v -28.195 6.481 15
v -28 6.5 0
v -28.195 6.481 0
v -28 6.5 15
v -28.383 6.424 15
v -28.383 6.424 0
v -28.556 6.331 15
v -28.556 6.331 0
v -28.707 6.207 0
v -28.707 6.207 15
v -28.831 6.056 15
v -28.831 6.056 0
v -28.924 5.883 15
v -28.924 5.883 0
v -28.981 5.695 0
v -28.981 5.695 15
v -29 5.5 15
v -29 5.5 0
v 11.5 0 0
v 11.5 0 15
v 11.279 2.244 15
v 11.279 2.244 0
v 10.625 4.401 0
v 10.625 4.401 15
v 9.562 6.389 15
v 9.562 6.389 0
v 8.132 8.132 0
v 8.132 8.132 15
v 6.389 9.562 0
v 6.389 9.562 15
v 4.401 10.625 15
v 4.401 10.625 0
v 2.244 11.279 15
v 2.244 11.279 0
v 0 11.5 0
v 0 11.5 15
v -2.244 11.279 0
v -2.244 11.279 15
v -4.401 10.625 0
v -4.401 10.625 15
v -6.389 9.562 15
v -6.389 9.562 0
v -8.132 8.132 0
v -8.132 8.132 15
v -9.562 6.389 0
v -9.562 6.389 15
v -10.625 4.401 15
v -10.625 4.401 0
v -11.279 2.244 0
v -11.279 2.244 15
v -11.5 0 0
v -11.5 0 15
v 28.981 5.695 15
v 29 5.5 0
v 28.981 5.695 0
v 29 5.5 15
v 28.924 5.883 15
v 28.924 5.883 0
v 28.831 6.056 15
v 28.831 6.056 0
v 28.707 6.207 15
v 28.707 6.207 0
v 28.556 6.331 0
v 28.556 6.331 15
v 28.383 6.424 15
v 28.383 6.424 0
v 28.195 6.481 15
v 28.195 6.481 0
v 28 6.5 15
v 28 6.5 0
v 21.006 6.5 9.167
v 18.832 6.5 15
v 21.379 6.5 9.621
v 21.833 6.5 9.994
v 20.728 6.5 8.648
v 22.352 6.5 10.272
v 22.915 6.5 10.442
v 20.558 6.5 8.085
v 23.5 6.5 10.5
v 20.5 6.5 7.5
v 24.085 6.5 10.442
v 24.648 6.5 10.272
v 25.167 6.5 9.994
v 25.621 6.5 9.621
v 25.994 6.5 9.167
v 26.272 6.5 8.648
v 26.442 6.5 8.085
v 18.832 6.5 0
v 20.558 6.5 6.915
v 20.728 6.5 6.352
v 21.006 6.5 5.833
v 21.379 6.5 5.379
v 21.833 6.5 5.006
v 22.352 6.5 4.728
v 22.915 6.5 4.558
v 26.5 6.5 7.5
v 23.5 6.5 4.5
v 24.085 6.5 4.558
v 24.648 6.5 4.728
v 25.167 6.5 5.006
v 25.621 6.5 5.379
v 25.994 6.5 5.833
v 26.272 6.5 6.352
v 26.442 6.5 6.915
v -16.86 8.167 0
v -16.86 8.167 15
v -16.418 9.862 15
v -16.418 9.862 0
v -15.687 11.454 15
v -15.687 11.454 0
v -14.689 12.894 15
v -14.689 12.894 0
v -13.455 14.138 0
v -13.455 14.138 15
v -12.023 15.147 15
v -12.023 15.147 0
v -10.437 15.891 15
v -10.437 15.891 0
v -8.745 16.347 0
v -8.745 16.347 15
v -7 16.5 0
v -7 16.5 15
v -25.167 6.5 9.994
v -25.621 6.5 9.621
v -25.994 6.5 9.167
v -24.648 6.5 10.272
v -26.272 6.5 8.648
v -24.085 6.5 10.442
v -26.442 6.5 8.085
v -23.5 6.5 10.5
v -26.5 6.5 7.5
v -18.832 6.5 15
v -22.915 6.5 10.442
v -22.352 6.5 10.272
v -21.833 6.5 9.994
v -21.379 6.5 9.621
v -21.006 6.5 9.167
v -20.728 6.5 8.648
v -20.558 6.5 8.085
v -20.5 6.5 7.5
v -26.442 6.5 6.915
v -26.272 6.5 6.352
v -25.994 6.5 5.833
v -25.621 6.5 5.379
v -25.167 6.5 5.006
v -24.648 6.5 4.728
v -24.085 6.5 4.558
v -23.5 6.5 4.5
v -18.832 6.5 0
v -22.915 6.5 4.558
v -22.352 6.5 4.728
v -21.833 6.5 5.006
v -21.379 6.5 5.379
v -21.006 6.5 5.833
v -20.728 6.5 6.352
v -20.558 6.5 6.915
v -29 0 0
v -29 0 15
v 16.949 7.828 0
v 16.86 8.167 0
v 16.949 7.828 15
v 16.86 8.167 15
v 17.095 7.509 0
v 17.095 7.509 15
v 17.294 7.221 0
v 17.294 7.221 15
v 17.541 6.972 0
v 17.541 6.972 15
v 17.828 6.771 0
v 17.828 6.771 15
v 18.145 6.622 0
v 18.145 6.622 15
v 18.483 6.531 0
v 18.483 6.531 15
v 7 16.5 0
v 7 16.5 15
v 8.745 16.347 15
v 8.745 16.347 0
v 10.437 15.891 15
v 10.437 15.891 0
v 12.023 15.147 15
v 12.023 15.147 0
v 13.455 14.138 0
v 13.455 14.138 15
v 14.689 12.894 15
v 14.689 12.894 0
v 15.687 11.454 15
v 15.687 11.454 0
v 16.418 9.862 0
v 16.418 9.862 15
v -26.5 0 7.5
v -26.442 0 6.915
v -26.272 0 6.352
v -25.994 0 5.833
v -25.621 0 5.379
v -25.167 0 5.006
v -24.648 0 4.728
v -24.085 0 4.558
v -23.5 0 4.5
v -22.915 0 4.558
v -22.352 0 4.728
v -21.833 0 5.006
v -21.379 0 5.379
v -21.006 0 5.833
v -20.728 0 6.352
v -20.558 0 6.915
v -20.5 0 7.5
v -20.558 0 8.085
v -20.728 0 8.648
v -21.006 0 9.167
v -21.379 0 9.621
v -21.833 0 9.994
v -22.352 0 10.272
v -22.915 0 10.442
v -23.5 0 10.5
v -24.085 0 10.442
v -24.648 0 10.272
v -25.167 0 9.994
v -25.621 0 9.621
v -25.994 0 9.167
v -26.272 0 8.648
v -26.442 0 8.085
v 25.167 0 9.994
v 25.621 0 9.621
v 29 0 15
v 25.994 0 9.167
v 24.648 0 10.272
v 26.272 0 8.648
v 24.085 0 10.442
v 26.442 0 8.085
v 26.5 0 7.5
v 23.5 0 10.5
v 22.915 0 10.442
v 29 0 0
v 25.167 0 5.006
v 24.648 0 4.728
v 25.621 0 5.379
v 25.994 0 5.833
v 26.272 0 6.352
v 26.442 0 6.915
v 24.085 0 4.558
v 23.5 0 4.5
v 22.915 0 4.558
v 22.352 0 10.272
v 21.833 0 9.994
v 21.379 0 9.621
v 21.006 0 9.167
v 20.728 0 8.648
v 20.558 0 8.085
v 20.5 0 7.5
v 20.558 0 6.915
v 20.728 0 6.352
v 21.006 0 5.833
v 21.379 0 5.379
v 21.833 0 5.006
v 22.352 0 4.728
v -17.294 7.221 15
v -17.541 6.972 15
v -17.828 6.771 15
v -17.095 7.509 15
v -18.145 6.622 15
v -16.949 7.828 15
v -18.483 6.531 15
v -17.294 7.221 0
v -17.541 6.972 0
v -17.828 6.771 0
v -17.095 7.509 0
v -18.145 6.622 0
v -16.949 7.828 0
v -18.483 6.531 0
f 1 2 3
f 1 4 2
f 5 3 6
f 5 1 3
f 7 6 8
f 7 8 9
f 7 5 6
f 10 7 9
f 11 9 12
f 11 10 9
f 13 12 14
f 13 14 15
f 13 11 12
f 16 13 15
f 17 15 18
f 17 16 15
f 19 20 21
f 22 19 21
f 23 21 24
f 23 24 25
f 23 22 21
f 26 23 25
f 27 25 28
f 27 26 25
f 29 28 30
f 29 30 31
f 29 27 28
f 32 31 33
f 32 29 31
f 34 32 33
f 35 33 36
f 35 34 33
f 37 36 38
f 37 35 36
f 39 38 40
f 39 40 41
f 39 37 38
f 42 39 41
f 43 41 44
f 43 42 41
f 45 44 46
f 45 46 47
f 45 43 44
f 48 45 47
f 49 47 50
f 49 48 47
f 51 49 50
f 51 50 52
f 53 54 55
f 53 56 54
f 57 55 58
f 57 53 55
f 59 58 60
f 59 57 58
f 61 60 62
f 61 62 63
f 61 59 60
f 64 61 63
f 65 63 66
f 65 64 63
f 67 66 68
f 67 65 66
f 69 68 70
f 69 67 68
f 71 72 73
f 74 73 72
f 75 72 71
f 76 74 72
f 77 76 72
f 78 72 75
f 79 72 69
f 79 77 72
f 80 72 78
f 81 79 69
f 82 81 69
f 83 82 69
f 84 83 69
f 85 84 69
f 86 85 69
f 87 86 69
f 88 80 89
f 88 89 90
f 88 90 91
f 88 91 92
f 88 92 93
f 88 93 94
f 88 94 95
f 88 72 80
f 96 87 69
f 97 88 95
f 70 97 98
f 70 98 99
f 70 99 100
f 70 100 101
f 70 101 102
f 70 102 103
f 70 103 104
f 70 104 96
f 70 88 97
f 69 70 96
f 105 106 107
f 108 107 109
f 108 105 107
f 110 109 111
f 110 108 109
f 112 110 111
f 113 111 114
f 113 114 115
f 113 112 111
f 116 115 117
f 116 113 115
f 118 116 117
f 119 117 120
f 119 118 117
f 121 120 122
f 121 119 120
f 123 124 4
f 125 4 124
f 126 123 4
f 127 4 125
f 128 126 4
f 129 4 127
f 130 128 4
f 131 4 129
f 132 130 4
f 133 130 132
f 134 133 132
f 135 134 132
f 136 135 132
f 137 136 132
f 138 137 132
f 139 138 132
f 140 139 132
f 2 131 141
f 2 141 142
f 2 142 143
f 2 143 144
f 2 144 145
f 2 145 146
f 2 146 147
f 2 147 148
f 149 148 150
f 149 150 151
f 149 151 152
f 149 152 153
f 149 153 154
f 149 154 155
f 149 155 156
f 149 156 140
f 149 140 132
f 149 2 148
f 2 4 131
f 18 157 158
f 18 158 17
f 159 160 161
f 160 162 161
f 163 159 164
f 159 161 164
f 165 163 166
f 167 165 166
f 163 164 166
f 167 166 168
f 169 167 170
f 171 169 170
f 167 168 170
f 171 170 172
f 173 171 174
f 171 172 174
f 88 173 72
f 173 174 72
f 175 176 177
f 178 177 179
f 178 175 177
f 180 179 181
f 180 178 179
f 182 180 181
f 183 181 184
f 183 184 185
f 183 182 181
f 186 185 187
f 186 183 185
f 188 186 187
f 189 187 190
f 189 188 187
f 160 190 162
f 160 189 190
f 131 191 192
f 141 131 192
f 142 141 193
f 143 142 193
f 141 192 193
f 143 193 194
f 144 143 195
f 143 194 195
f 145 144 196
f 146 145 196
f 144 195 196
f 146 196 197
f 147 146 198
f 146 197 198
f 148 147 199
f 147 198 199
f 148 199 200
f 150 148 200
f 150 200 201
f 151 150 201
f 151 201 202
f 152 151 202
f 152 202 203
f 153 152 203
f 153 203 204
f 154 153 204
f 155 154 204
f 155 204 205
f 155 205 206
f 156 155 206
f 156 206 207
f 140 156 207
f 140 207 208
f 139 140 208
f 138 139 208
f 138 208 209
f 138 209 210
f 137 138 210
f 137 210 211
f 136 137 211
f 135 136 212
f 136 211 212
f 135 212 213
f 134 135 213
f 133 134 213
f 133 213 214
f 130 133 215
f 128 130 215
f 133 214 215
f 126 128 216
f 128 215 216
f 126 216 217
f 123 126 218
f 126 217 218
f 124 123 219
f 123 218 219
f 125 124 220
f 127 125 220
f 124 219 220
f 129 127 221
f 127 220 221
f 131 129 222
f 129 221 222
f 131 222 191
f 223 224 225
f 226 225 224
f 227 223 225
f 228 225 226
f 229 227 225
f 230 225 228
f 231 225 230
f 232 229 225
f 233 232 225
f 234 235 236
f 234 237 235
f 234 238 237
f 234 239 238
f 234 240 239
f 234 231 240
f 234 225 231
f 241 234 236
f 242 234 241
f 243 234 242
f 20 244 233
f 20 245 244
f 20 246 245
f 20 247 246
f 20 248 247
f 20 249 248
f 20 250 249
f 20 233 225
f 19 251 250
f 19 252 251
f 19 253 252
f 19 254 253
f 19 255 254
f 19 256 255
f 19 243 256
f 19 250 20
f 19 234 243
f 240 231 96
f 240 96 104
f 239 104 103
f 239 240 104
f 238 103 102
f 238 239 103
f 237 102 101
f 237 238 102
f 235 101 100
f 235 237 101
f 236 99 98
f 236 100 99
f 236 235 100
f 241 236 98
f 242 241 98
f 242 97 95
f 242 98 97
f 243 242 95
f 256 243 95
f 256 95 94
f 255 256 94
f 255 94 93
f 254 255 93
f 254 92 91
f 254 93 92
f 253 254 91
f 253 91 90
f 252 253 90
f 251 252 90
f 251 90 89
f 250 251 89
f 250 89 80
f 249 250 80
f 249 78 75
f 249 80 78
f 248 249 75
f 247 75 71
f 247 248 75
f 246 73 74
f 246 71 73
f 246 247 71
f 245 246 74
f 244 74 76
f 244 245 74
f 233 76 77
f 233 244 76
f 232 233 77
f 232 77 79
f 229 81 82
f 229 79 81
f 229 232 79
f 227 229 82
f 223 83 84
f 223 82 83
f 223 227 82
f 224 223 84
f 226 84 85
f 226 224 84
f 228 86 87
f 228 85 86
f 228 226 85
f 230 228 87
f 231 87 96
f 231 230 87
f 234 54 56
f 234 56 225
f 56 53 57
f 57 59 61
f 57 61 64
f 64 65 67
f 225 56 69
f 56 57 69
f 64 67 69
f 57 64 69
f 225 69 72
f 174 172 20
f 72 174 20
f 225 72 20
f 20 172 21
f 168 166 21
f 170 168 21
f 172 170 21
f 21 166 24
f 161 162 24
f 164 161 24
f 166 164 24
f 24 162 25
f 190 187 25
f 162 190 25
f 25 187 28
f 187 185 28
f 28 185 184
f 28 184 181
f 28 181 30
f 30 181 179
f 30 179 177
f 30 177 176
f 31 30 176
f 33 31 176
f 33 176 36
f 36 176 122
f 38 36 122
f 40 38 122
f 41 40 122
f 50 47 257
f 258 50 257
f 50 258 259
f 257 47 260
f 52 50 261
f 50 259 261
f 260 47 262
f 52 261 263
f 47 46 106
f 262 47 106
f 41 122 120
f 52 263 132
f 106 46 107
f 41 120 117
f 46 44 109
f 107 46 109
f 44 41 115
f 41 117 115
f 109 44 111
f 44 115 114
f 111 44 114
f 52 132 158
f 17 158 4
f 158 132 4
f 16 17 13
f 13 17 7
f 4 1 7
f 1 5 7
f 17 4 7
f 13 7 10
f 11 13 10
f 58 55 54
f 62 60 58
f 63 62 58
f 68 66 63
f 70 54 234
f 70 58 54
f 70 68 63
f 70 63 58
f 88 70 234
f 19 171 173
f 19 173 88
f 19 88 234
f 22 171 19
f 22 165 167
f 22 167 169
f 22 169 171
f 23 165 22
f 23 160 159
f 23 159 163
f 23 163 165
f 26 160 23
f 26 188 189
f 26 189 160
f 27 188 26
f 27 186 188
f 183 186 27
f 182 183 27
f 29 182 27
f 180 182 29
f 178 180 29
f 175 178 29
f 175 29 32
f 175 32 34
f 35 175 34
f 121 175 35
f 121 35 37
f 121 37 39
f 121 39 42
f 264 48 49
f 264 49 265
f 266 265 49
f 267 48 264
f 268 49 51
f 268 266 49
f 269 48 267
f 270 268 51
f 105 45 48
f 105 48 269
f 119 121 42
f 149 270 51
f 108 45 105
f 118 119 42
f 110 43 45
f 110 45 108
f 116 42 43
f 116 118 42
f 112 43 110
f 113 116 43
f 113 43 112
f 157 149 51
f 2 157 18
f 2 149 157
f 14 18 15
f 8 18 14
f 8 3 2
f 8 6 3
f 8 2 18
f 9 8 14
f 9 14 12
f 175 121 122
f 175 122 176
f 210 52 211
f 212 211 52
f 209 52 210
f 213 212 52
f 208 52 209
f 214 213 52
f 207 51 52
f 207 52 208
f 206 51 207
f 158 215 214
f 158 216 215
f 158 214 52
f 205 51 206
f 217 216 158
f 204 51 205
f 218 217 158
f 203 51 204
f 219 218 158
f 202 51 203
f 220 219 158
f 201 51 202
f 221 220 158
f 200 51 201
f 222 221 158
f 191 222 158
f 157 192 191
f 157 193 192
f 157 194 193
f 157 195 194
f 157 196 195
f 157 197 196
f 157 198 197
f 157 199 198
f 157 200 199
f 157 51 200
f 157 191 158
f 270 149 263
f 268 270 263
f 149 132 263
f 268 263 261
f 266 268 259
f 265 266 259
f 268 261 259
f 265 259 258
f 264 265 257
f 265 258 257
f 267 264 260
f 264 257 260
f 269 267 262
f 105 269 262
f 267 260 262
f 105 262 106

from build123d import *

# Parameters (mm, degrees)
DODANIE_WYCI_GNI_CIE1_DEPTH = 15
ZAOKR_GLENIE1_R             = 2
OTWORY_USTALAJ_CE_6_0MM3_D  = 6
ZAOKR_GLENIE2_R             = 1


with BuildPart() as part:
    # Szkic1 → Dodanie-wyciągnięcie1 (new body)
    with BuildSketch(Plane.XY):
        with BuildLine():
            Line((-29, 0), (-29, 6.5))
            Line((-29, 6.5), (-17, 6.5))
            ThreePointArc((-17, 6.5), (-14.071067812, 13.571067812), (-7, 16.5))
            Line((-7, 16.5), (7, 16.5))
            ThreePointArc((7, 16.5), (14.071067812, 13.571067812), (17, 6.5))
            Line((17, 6.5), (29, 6.5))
            Line((29, 6.5), (29, 0))
            Line((29, 0), (11.5, 0))
            ThreePointArc((11.5, 0), (0, 11.5), (-11.5, 0))
            Line((-11.5, 0), (-29, 0))
        make_face()
    extrude(amount=DODANIE_WYCI_GNI_CIE1_DEPTH)

    # Zaokrąglenie1
    zaokr_glenie1_edges = [part.edges().sort_by_distance(p)[0] for p in [
        (-17, 6.5, 7.5),
        (17, 6.5, 7.5),
    ]]
    fillet(zaokr_glenie1_edges, radius=ZAOKR_GLENIE1_R)

    # Otwory ustalające Ø6.0mm3 (through all)
    with Locations(Plane(origin=(0, 6.5, 0), x_dir=(1, 0, 0), z_dir=(0, 1, 0))):
        with Locations((-23.5, -7.5)):
            otwory_ustalaj_ce_6_0mm3 = Hole(OTWORY_USTALAJ_CE_6_0MM3_D / 2)

    # Lustro1: Otwory ustalające Ø6.0mm3 across plane
    add(otwory_ustalaj_ce_6_0mm3.mirror(Plane(origin=(0, 0, 0), x_dir=(0, 0, 1), z_dir=(1, 0, 0))), mode=Mode.SUBTRACT)

    # Zaokrąglenie2
    zaokr_glenie2_edges = [part.edges().sort_by_distance(p)[0] for p in [
        (29, 6.5, 7.5),
        (-29, 6.5, 7.5),
    ]]
    fillet(zaokr_glenie2_edges, radius=ZAOKR_GLENIE2_R)


solid = part.part
